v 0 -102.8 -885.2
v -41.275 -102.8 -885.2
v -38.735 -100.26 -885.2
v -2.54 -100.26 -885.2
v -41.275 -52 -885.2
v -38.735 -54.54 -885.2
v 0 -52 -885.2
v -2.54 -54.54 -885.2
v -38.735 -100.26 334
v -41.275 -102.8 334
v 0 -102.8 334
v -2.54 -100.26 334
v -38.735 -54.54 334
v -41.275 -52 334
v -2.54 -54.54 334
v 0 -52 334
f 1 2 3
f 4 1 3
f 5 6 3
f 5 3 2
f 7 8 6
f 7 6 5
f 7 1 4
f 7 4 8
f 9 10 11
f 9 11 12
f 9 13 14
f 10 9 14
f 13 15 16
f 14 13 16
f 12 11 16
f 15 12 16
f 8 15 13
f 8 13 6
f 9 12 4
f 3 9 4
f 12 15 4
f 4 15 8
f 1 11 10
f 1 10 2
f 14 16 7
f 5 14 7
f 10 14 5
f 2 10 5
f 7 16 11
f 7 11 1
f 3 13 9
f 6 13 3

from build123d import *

# Parameters (mm, degrees)
SKETCH4_W           = 1219.2
SKETCH4_H           = 50.8
BOSS_EXTRUDE2_DEPTH = 41.275
SHELL7_T            = -2.54


with BuildPart() as part:
    # Sketch4 → Boss-Extrude2 (new body)
    with BuildSketch(Plane(origin=(0, 0, 0), x_dir=(0, 0, -1), z_dir=(1, 0, 0))):
        with Locations((275.6, -77.4)):
            Rectangle(SKETCH4_W, SKETCH4_H)
    extrude(amount=-BOSS_EXTRUDE2_DEPTH)

    # Shell7
    shell7_openings = [part.faces().sort_by_distance(p)[0] for p in [
        (-20.6375, -77.4, -885.2),
        (-20.6375, -77.4, 334),
    ]]
    offset(amount=SHELL7_T, openings=shell7_openings, kind=Kind.INTERSECTION)


solid = part.part
